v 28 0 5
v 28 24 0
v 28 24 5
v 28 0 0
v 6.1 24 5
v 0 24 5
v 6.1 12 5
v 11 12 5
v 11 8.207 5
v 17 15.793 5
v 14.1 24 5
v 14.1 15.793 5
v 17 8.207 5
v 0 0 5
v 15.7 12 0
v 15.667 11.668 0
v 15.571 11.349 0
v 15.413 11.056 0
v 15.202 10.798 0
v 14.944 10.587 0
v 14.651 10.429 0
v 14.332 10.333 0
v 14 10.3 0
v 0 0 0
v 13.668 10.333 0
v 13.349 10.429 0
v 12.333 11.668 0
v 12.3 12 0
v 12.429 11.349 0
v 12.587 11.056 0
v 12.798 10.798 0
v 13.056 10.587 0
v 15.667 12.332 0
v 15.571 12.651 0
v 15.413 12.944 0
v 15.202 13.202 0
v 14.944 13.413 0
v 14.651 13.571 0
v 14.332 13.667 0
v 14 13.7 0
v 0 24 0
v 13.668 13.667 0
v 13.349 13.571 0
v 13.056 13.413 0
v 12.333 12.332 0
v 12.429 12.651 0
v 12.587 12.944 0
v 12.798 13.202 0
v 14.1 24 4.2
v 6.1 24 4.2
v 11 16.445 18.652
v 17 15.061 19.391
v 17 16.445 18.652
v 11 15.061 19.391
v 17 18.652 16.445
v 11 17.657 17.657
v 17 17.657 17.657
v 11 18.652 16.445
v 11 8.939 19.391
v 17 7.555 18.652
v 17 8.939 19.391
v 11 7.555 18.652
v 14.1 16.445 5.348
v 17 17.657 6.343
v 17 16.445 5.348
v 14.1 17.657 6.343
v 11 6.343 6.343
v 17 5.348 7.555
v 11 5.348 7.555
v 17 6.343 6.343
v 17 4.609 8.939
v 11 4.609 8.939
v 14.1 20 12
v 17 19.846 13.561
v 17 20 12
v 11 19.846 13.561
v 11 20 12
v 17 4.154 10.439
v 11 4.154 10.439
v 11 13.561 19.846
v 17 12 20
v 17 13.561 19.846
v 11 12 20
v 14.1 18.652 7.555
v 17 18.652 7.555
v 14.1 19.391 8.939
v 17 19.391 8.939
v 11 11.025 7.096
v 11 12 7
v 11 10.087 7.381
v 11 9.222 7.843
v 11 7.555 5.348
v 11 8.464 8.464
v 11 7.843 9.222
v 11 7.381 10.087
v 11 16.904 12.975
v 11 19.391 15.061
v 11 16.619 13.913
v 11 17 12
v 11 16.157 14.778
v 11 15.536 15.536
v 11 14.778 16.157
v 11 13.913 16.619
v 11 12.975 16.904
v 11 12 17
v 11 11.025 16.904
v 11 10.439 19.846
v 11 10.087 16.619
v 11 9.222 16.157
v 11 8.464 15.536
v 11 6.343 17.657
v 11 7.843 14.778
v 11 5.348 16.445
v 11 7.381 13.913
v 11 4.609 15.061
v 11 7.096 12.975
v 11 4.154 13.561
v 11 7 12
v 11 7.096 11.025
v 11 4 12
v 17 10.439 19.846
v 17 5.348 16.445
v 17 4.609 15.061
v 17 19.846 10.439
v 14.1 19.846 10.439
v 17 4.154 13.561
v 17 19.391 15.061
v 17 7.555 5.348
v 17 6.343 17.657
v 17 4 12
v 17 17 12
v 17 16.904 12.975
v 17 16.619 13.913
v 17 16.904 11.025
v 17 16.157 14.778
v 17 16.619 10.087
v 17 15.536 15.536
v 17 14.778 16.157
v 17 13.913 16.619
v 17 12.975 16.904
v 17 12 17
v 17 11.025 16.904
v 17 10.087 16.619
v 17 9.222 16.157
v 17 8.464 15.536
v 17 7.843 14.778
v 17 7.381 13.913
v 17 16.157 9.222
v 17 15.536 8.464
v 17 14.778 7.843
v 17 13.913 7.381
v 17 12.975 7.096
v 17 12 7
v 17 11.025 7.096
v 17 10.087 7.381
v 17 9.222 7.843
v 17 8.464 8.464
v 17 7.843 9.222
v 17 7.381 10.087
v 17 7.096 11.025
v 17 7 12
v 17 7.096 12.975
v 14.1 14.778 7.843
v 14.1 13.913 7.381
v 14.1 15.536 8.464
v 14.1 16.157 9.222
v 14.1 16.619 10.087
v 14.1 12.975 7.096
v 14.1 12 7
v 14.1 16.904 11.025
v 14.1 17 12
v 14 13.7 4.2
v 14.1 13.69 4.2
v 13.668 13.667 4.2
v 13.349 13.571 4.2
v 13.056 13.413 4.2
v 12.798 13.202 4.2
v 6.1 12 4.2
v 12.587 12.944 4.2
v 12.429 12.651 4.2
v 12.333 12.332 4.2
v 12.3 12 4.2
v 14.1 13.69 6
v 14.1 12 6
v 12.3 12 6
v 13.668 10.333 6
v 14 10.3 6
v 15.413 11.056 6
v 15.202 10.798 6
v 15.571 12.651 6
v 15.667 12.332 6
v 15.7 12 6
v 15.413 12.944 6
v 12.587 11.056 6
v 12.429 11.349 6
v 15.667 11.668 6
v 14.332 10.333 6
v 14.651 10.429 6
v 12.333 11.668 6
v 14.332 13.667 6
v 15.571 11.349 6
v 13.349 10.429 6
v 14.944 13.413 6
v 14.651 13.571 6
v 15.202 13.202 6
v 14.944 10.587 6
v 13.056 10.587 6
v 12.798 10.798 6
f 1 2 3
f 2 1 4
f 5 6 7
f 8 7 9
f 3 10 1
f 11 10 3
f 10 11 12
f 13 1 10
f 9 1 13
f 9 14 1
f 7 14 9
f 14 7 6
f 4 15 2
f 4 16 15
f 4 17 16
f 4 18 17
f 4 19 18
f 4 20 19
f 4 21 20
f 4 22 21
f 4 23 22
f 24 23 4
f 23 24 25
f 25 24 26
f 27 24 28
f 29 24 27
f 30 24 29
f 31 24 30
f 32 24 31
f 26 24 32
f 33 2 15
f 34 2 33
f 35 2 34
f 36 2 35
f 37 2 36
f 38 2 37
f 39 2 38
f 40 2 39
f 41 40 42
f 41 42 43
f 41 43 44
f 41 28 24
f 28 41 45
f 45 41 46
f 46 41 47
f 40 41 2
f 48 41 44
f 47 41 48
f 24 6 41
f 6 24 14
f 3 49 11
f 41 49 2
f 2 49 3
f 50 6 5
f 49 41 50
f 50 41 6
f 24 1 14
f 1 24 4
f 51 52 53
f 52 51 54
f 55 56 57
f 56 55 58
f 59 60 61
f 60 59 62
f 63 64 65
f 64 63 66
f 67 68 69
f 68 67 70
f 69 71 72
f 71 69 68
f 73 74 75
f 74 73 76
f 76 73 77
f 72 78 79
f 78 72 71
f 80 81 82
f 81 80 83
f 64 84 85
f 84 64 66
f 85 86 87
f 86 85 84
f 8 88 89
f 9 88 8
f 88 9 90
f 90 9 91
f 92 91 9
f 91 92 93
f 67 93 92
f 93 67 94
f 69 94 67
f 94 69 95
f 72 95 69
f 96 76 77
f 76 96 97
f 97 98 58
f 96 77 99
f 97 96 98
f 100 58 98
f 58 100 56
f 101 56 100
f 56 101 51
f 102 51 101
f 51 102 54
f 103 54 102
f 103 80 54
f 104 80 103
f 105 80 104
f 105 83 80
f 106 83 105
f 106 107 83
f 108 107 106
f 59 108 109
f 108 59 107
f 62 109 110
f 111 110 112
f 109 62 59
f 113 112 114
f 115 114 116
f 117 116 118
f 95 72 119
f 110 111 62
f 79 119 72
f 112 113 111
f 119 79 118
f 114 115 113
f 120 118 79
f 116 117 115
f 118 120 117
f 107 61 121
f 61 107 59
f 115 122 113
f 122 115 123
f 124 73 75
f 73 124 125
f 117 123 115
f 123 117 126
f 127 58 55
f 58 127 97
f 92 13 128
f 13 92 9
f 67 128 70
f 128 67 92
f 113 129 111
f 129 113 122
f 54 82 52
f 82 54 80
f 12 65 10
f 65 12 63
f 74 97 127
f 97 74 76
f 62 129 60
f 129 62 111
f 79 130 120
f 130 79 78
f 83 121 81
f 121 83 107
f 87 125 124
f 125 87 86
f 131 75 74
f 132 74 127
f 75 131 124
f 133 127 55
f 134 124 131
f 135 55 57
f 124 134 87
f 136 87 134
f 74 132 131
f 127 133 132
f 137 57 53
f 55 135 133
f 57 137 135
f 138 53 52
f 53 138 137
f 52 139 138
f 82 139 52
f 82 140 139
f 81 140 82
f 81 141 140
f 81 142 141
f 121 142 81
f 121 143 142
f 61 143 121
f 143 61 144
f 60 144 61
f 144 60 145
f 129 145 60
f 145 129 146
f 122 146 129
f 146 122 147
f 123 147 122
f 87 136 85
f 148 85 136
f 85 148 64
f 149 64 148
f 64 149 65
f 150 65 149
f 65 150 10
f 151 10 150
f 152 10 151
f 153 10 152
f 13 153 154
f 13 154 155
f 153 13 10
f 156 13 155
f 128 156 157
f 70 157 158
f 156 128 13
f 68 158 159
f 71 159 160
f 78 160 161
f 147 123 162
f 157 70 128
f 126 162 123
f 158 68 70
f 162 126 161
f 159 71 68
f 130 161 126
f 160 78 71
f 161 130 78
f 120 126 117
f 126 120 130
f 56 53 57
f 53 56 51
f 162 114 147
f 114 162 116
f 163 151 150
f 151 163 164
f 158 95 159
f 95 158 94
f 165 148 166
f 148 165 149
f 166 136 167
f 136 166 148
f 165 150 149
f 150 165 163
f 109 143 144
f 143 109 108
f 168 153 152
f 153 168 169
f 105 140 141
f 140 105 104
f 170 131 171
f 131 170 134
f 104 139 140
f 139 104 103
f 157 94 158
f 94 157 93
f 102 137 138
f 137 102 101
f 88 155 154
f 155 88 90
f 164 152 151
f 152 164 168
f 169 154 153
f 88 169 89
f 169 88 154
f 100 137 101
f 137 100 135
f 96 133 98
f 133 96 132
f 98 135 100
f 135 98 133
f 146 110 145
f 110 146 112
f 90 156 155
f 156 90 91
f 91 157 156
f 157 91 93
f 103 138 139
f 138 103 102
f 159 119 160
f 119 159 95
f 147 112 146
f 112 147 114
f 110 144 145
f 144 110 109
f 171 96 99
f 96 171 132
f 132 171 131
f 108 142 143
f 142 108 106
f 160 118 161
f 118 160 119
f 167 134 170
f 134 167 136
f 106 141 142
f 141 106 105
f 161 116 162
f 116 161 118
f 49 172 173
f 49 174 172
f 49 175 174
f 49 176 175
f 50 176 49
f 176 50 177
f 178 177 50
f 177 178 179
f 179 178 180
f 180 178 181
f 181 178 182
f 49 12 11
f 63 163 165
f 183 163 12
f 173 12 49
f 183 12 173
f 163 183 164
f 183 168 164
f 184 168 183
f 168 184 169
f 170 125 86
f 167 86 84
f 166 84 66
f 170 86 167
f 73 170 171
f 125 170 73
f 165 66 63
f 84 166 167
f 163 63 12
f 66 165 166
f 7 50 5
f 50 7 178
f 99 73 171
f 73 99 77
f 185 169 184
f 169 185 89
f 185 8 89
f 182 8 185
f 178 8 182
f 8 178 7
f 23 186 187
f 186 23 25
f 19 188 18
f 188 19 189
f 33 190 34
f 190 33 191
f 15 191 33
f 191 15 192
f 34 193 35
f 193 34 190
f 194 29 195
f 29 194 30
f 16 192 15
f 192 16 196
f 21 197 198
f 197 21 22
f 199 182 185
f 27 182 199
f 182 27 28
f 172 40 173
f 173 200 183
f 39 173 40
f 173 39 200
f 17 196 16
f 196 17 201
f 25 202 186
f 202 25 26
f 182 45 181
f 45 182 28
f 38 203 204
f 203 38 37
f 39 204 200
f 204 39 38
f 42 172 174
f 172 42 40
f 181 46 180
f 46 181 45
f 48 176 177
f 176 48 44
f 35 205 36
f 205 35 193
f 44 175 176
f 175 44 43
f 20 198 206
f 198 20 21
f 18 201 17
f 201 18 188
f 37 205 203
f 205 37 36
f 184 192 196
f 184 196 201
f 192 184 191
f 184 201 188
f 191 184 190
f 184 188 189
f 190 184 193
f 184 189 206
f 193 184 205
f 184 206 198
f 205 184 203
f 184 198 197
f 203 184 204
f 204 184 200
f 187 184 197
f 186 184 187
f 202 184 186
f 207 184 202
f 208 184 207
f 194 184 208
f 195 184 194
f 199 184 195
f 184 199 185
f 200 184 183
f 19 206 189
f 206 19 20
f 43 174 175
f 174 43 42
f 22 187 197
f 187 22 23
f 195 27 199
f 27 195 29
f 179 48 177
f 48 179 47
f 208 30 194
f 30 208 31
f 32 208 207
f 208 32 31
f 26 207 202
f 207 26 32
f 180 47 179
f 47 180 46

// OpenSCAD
$fn = 32;

// ----------------------------------------------------------------------
// Cable clip: cable 10 mm, clamp 16 mm, base 28 mm
// ----------------------------------------------------------------------

// --- parameters (mm) ---
foot_w = 28;              // base length, X
foot_d = 24;              // base width, Y
foot_t = 5;               // base thickness
hose_seat_d = 16;         // clamp outside diameter
ring_t = 3;               // clamp wall
cable_d = 10;             // cable opening
ring_w = 6;               // clamp width along the cable
screw_d = 3.4;            // screw clearance
throat = 7.8;             // snap throat width
sink = 1;                 // overlap of the clamp into the base

module base() {
  cube([foot_w, foot_d, foot_t]);
}

module clamp() {
  translate([foot_w / 2, foot_d / 2, foot_t + hose_seat_d / 2 - sink]) rotate([0, 90, 0])
    cylinder(h = ring_w, d = hose_seat_d, center = true);
}

difference() {
  union() {
    base();
    clamp();
  }
  translate([foot_w / 2, foot_d / 2, foot_t + hose_seat_d / 2 - sink]) rotate([0, 90, 0]) translate([0, 0, -ring_w / 2 - 1]) cylinder(h = ring_w + 2, d = cable_d);
  /* snap throat: the opening is narrower than the cable */
  translate([foot_w / 2 - throat / 2, foot_d / 2, foot_t + hose_seat_d / 2 - sink]) rotate([0, 90, 0]) translate([0, 0, -ring_w / 2 - 1]) cube([throat, hose_seat_d + 2, ring_w + 2]);
  translate([14, foot_d / 2, -1]) cylinder(h = foot_t + 2, d = screw_d);
}
